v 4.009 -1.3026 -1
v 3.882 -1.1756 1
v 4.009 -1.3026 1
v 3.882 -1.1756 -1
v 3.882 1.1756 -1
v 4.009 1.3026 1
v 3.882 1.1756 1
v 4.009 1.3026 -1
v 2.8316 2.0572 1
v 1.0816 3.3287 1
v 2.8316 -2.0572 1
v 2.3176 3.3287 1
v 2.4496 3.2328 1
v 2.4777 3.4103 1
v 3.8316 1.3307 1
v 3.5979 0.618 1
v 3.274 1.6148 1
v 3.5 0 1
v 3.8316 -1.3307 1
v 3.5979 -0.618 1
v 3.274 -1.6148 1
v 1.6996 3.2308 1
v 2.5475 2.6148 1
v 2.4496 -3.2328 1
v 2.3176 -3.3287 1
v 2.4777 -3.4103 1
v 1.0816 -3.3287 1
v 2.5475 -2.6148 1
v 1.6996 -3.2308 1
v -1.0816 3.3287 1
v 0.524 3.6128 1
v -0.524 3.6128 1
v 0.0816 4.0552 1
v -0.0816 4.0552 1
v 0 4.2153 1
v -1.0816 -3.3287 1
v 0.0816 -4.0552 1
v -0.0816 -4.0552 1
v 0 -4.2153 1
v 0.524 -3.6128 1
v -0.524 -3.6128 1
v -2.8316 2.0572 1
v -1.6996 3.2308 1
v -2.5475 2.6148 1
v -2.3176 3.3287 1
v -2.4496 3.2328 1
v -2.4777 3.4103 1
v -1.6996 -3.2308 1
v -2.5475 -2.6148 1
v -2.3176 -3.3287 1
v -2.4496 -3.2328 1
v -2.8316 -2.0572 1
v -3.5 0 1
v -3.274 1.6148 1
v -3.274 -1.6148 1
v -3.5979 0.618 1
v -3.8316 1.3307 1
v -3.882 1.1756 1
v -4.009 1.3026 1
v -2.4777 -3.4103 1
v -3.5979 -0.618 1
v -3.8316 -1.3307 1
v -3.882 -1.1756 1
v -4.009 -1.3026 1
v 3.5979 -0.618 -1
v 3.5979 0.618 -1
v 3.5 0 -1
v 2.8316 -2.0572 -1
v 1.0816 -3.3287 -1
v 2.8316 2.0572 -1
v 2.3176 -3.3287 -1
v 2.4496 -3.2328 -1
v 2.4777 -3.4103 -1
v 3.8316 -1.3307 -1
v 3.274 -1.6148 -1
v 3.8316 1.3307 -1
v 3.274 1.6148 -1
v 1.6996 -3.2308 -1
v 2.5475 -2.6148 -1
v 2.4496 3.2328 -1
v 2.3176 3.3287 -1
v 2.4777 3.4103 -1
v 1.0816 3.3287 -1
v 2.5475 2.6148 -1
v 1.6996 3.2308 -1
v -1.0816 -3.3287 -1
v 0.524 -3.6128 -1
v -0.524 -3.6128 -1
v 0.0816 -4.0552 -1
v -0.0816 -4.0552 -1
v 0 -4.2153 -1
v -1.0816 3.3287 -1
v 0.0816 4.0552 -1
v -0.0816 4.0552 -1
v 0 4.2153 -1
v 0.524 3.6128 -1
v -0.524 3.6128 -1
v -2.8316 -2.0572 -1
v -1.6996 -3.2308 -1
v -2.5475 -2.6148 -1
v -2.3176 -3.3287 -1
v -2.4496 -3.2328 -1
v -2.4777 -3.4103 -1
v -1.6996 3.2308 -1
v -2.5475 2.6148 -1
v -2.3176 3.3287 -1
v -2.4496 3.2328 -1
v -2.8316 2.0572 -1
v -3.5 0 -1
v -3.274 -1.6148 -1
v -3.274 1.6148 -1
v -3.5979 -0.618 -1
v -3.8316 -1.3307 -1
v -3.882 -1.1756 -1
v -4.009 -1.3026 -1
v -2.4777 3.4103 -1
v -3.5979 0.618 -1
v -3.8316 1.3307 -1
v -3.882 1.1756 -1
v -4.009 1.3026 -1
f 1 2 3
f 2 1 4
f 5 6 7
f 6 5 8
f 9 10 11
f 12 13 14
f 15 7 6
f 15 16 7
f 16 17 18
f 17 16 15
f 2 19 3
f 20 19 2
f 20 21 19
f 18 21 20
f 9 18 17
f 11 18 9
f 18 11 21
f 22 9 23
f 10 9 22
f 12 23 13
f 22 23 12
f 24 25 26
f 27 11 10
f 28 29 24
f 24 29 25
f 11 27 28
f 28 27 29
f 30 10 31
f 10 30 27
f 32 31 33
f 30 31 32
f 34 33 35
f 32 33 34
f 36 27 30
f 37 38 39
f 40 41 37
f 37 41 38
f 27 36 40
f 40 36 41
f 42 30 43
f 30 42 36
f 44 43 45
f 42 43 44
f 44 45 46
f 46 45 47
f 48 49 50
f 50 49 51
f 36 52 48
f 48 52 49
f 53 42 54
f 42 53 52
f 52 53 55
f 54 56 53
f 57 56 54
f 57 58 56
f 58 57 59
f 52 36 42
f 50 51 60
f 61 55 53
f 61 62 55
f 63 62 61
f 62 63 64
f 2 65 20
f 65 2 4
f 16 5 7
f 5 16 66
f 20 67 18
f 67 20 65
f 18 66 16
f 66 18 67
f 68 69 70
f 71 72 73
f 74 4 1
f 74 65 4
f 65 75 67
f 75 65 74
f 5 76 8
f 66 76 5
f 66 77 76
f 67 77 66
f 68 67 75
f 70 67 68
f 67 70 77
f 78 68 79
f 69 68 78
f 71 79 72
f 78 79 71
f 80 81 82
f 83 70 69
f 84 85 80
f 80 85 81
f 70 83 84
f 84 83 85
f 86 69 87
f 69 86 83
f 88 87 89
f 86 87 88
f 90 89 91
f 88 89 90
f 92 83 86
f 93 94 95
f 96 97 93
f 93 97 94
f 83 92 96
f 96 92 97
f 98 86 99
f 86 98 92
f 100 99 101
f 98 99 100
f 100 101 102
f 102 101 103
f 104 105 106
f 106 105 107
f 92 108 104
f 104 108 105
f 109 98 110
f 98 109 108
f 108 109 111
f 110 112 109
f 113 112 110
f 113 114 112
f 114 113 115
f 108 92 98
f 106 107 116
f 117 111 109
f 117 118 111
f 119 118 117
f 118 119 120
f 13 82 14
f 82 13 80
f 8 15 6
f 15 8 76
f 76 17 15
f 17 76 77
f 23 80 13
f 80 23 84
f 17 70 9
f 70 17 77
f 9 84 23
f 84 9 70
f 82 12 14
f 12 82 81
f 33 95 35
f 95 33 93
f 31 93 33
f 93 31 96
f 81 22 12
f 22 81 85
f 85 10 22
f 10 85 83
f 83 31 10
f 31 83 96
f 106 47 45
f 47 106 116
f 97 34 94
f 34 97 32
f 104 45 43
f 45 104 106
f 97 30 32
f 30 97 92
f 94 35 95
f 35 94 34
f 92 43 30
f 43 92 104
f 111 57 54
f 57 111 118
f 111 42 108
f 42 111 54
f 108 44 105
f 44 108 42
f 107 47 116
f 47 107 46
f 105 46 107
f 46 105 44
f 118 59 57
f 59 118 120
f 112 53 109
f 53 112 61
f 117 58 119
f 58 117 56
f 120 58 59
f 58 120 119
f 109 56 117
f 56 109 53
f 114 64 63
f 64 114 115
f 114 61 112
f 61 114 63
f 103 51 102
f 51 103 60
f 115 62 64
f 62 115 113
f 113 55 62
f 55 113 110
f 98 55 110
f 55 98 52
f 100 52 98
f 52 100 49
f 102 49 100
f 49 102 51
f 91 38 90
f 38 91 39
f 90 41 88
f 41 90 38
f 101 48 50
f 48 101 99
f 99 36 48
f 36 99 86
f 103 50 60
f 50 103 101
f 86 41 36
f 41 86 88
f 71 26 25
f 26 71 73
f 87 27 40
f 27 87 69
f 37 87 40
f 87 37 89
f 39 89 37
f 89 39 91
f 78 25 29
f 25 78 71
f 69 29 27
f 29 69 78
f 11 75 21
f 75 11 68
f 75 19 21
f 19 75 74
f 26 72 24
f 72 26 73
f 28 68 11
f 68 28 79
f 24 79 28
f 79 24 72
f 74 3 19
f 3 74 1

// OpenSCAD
numGaps = 10;

difference(){
	

	cylinder(h = 2, r=5, $fn=20, center=true);

	for(i= [0 : numGaps]){
		echo((i/numGaps)*360);

		
			rotate([0,0,(i/numGaps)*360]){
			
			translate([5.5,0,0]){
		
				cylinder(h = 2, r=2, $fn=20, center=true);
			}
		}
	}
}
